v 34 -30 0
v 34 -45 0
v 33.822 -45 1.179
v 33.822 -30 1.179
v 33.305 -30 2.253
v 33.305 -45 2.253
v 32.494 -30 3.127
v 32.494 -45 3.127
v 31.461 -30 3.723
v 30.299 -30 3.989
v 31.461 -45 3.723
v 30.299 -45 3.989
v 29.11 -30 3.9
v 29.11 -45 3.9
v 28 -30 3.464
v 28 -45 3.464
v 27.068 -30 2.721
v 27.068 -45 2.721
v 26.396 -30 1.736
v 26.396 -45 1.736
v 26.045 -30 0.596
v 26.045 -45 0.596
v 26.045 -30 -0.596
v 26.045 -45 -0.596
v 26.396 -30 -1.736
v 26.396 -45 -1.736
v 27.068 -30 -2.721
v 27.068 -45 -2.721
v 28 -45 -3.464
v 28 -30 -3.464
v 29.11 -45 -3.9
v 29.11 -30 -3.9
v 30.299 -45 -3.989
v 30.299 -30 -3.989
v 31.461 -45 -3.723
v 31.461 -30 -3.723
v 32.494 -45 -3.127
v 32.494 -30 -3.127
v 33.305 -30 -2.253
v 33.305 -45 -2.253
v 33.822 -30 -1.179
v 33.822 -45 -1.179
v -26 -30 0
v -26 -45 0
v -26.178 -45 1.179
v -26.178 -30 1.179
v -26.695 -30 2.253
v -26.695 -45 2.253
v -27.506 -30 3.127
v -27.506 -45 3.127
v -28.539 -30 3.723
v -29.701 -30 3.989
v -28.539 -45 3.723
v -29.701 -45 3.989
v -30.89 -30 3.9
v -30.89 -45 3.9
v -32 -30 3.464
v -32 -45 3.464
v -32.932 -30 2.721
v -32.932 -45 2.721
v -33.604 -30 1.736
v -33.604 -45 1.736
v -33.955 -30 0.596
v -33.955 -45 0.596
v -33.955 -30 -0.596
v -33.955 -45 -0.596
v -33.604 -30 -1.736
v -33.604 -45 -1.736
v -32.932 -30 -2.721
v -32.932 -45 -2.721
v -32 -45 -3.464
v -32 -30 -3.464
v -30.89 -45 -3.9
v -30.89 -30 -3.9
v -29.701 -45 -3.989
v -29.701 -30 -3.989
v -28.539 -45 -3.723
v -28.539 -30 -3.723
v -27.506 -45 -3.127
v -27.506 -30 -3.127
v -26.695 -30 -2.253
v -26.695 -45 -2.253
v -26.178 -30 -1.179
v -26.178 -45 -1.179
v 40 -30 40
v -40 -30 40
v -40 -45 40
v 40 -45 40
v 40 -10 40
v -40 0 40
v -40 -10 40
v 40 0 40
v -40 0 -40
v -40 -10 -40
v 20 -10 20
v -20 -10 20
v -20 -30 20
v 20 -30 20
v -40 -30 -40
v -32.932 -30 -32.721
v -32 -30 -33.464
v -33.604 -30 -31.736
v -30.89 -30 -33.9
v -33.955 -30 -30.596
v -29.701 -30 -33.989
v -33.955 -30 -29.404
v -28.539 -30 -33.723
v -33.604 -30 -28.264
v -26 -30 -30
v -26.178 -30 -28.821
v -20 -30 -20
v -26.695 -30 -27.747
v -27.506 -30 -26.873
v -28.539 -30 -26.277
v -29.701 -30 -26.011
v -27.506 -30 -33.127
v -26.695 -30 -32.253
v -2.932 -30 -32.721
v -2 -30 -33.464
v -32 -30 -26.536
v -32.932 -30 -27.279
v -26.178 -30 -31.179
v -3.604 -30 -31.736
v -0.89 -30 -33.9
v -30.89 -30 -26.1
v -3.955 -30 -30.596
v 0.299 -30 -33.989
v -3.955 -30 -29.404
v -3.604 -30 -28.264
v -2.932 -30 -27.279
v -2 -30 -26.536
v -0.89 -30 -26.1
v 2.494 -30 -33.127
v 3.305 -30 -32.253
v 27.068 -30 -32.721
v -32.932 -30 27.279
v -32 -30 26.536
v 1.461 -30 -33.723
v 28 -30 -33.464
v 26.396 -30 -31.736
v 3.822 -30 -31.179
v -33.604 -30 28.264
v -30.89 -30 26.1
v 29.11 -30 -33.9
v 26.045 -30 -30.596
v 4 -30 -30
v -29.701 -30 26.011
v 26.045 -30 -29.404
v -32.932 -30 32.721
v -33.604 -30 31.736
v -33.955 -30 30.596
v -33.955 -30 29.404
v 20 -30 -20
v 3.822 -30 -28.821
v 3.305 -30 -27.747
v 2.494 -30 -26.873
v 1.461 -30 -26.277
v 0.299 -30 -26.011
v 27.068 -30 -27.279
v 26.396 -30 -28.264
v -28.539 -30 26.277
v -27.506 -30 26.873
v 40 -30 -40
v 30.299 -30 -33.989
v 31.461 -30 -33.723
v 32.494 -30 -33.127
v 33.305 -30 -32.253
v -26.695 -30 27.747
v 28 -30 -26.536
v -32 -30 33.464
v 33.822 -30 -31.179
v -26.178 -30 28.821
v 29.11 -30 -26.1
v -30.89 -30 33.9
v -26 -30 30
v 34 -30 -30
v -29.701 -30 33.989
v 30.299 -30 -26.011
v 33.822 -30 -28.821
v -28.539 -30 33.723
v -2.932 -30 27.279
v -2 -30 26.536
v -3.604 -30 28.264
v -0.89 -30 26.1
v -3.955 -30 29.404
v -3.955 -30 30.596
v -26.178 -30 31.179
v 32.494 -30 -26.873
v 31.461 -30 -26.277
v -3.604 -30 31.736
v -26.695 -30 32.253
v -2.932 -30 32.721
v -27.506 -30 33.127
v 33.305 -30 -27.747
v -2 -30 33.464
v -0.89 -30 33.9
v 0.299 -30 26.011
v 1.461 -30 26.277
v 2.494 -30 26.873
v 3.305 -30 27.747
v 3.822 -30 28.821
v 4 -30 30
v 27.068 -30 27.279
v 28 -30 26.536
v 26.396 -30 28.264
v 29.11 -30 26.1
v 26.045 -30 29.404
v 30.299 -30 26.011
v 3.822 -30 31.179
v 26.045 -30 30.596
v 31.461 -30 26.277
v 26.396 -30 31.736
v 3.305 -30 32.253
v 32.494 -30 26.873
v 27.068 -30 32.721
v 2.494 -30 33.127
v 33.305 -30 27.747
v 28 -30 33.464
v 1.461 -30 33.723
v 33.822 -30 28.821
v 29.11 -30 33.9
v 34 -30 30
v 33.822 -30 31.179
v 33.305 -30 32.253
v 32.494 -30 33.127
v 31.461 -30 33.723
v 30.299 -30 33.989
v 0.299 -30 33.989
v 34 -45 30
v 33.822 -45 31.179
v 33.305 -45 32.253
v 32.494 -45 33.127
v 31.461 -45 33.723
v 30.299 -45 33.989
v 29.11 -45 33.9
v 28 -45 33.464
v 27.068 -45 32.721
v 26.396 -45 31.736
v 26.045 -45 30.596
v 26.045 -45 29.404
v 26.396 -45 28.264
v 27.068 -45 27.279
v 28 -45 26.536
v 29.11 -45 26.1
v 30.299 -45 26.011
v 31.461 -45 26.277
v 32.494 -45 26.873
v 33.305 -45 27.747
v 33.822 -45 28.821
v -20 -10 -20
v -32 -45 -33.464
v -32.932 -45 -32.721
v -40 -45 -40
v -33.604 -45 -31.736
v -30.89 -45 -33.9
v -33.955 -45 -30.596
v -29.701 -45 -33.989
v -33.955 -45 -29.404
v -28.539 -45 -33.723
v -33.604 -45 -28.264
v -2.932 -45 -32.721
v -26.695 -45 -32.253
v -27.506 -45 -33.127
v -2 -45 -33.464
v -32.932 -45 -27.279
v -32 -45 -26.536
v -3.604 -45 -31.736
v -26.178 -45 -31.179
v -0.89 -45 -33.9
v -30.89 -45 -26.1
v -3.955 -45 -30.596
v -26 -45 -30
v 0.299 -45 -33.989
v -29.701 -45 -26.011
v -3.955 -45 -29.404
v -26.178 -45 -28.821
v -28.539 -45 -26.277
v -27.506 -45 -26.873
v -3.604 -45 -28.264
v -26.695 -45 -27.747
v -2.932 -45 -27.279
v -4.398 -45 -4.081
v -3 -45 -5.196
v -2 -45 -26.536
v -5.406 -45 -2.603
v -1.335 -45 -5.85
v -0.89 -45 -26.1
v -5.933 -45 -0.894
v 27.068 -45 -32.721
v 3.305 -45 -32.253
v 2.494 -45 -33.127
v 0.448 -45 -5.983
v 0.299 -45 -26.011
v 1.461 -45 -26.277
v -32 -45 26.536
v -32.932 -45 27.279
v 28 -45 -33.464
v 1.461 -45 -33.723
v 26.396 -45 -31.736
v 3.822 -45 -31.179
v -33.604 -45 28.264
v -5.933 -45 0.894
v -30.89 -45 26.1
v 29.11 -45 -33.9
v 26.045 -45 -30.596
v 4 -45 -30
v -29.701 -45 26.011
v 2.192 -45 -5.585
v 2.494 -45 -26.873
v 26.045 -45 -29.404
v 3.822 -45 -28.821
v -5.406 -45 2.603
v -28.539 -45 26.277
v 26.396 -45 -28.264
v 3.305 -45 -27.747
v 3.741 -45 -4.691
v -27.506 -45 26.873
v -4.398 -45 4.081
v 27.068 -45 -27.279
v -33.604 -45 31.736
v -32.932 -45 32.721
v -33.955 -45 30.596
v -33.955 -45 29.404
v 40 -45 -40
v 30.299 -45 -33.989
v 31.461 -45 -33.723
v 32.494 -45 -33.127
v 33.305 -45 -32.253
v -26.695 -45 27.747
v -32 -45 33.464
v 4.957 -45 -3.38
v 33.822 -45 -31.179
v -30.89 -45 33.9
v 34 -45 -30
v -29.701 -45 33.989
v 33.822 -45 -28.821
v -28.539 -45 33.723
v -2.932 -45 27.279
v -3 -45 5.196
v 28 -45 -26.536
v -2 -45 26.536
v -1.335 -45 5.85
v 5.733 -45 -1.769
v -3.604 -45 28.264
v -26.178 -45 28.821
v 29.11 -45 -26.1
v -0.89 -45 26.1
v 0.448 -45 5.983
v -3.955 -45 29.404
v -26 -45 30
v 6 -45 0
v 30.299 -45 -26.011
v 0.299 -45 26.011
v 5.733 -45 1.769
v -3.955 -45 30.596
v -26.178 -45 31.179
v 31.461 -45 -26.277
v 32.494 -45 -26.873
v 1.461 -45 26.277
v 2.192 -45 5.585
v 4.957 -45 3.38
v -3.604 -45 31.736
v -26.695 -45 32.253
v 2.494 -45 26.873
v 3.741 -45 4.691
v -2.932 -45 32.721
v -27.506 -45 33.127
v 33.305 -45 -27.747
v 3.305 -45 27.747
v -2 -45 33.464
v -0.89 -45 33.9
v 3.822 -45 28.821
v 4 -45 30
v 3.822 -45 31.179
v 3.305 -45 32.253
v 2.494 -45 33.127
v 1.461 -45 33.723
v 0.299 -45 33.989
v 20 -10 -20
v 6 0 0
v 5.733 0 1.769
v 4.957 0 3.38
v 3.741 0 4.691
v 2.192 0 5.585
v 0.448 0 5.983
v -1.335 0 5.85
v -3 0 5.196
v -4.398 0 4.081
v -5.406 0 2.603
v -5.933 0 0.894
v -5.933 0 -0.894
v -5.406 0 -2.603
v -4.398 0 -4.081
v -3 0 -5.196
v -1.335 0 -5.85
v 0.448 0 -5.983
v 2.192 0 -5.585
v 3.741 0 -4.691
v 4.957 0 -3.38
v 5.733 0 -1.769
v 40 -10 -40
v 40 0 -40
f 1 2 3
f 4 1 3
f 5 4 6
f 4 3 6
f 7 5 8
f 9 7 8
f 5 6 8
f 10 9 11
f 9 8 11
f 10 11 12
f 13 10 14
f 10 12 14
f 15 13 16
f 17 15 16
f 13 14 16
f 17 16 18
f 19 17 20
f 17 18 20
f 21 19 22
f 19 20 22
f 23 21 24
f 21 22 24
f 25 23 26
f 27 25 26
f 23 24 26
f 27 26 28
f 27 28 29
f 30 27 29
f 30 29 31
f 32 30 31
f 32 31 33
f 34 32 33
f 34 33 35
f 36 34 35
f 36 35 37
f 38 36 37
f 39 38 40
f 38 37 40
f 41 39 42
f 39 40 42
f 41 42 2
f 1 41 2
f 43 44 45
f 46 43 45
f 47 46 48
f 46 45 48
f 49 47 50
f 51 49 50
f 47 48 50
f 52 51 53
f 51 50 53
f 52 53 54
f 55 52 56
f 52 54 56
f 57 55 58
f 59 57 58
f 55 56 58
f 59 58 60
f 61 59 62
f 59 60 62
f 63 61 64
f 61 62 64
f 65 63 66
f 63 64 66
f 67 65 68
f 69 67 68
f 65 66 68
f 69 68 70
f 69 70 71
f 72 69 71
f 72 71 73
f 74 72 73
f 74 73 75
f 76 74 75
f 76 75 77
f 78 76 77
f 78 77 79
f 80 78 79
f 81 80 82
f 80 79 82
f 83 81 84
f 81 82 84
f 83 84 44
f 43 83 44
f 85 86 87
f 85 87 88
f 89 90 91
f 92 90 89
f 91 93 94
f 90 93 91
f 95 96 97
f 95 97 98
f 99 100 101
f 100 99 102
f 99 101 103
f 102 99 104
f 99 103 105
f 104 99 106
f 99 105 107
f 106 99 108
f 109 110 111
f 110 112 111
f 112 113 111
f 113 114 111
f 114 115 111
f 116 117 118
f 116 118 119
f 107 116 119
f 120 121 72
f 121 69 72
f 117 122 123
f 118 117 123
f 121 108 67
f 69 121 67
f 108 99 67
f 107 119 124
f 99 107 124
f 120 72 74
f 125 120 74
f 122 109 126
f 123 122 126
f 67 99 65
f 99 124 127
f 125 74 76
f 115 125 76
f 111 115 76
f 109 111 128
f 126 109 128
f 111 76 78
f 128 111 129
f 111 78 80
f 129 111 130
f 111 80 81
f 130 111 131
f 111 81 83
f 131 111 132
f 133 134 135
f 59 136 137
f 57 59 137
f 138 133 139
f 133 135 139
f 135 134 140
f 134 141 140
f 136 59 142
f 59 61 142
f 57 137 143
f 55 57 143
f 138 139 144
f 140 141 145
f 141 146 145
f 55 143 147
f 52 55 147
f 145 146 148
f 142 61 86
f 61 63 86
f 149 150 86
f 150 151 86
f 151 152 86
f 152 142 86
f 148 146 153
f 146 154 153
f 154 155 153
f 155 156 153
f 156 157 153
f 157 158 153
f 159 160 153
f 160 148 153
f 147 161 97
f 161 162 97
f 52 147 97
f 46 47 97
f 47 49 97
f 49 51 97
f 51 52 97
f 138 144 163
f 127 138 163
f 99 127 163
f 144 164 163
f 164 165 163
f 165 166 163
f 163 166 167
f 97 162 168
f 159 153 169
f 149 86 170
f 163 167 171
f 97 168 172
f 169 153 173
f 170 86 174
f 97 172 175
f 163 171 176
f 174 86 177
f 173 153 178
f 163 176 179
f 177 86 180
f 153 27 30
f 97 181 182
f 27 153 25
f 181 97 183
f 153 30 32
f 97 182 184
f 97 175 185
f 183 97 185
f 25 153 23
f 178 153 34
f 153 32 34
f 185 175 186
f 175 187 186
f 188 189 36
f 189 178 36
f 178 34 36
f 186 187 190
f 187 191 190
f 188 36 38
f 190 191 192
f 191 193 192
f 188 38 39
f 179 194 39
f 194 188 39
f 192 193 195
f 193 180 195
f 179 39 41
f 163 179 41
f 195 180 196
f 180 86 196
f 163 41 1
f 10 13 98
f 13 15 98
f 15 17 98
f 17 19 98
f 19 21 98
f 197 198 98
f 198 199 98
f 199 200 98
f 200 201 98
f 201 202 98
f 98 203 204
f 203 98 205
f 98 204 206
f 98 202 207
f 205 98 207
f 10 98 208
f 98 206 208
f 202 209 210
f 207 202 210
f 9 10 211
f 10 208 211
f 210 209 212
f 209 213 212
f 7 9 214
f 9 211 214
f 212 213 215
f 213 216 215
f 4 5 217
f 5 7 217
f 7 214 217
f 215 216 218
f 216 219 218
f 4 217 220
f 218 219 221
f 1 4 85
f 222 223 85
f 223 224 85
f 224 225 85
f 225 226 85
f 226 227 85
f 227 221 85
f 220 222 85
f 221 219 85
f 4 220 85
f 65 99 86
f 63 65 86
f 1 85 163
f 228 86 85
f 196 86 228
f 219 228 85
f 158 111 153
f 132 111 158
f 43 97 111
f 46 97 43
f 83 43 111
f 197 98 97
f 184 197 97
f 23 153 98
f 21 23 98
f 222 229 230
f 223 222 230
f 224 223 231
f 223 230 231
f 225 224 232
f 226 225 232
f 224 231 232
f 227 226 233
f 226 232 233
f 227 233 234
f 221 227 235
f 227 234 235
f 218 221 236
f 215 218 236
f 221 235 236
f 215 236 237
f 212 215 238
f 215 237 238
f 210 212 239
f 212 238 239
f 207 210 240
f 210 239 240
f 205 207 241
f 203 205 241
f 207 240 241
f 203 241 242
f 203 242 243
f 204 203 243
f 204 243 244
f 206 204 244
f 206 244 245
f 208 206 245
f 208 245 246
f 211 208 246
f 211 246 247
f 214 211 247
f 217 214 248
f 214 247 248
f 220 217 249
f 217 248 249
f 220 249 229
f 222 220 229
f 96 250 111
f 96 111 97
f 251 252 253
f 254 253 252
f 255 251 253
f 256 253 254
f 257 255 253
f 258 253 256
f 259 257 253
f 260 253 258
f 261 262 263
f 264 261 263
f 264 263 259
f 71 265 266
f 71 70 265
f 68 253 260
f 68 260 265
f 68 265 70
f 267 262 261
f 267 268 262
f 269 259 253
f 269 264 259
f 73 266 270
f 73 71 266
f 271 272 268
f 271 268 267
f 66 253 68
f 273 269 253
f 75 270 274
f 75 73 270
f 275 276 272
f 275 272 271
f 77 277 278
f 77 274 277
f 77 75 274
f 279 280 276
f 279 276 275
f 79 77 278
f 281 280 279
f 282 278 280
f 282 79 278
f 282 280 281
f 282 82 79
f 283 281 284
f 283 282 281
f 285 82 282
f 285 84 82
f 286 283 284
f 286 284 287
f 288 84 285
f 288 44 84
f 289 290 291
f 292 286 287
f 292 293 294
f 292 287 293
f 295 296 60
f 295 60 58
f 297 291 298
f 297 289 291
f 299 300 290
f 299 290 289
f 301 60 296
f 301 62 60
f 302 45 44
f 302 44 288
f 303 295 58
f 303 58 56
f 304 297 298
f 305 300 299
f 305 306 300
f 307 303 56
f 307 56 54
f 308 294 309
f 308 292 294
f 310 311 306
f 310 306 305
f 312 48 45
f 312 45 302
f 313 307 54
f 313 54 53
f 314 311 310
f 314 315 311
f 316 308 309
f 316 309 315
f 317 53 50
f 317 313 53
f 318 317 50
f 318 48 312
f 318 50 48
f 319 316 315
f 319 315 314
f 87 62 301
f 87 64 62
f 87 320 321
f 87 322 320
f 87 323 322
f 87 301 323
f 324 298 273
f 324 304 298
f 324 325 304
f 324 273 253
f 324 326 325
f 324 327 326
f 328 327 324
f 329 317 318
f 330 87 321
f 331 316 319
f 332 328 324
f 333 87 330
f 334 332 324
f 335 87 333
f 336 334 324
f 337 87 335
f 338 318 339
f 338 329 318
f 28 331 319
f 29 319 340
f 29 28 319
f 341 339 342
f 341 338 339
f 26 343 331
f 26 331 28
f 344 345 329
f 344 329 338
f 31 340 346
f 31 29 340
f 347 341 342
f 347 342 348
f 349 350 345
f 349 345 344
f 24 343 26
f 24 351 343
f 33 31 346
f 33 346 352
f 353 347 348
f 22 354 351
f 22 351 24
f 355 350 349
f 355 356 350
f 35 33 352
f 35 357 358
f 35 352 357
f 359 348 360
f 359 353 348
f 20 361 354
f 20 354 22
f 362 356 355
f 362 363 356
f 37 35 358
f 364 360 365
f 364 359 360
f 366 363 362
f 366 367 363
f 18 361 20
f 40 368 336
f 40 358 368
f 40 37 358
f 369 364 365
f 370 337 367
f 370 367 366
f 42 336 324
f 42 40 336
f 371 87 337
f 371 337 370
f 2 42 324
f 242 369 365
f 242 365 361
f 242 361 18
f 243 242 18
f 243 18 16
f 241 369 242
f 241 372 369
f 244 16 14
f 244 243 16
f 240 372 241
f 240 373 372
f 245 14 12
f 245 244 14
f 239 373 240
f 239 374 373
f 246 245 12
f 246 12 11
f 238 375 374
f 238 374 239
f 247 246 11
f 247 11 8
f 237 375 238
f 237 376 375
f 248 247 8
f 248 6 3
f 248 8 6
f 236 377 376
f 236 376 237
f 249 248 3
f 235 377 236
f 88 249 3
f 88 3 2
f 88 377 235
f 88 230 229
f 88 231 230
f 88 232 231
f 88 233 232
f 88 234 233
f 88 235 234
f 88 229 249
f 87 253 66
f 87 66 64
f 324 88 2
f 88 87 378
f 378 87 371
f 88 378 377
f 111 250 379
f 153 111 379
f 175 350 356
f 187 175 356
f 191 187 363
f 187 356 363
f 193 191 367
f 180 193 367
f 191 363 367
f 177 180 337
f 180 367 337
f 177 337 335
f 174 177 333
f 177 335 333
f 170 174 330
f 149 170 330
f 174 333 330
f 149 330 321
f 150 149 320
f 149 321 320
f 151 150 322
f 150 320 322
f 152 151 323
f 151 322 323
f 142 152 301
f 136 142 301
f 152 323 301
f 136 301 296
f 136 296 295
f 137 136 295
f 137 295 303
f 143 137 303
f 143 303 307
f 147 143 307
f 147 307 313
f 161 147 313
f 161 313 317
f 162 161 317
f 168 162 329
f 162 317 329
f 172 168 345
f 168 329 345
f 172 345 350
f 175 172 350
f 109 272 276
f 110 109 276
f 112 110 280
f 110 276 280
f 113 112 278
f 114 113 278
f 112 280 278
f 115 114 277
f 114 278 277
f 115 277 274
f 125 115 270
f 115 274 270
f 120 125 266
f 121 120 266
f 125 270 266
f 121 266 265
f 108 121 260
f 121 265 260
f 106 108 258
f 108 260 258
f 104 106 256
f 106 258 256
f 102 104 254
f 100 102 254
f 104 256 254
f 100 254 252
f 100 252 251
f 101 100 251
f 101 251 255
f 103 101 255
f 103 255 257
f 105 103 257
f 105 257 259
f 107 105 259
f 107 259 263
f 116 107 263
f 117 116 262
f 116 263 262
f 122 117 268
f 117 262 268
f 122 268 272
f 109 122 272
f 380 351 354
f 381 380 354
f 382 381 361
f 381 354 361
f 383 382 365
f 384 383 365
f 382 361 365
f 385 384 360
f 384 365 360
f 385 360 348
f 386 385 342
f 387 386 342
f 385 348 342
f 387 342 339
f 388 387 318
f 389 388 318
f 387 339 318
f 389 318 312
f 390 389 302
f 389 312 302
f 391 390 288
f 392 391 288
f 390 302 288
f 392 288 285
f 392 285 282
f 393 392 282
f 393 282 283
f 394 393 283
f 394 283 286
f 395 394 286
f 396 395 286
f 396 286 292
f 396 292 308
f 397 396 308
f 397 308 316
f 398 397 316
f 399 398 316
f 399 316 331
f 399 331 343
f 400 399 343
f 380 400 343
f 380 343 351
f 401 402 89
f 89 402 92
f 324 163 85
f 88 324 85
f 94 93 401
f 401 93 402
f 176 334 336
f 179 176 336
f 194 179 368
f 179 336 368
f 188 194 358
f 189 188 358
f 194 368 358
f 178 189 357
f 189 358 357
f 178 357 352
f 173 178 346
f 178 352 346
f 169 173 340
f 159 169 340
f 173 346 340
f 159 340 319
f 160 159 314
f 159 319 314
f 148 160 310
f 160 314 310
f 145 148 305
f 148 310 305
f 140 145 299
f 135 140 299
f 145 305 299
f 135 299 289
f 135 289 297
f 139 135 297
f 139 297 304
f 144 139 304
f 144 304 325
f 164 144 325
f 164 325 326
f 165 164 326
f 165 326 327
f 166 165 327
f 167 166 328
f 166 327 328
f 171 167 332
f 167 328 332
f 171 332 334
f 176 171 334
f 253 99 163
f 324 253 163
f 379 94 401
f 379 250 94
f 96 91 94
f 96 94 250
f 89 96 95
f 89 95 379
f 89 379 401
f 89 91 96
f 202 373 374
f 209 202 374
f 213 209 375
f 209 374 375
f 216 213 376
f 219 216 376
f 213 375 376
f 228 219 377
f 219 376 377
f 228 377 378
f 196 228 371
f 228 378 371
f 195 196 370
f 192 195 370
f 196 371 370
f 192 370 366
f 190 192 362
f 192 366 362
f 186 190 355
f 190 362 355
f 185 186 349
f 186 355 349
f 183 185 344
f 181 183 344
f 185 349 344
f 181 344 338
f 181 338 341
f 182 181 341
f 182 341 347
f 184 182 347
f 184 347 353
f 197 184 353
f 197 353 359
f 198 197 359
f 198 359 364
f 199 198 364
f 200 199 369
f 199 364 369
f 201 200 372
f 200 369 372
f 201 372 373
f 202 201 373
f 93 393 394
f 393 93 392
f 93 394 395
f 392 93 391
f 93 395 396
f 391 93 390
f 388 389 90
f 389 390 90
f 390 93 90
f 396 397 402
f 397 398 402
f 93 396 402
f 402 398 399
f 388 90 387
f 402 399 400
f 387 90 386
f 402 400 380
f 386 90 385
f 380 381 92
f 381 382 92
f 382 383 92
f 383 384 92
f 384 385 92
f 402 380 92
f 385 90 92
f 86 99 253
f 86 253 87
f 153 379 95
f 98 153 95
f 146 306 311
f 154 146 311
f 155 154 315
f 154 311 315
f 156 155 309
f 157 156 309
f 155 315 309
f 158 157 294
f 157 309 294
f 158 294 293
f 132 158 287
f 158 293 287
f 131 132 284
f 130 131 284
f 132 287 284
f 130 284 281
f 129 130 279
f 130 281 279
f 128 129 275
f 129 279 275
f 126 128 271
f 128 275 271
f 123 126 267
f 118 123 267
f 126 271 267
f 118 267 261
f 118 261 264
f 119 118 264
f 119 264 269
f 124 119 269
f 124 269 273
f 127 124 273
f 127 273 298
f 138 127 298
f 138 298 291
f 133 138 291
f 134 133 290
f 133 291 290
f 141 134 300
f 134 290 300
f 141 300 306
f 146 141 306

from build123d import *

# Parameters (mm, degrees)
SKETCH_W        = 80
SKETCH_H        = 80
PAD_DEPTH       = 10
SKETCH001_W     = 40
SKETCH001_H     = 40
PAD001_DEPTH    = 20
SKETCH002_W     = 80
SKETCH002_H     = 80
PAD002_DEPTH    = 15
SKETCH003_R     = 4
POCKET_DEPTH    = 15
SKETCH004_R     = 6
POCKET001_DEPTH = 45.001


with BuildPart() as part:
    # Sketch → Pad (new body)
    with BuildSketch(Plane.XZ):
        Rectangle(SKETCH_W, SKETCH_H)
    extrude(amount=PAD_DEPTH)

    # Sketch001 (on Face6 of Pad) → Pad001 (join)
    with BuildSketch(Plane.XZ.offset(10)):
        Rectangle(SKETCH001_W, SKETCH001_H)
    extrude(amount=PAD001_DEPTH)

    # Sketch002 (on Face11 of Pad001) → Pad002 (join)
    with BuildSketch(Plane.XZ.offset(30)):
        Rectangle(SKETCH002_W, SKETCH002_H)
    extrude(amount=PAD002_DEPTH)

    # Sketch003 (on Face5 of Pad002) → Pocket (cut)
    with BuildSketch(Plane.XZ.offset(45)):
        with Locations((-30, 30)):
            Circle(SKETCH003_R)
        with Locations((30, 30)):
            Circle(SKETCH003_R)
        with Locations((30, -30)):
            Circle(SKETCH003_R)
        with Locations((-30, -30)):
            Circle(SKETCH003_R)
        with Locations((0, -30)):
            Circle(SKETCH003_R)
        with Locations((0, 30)):
            Circle(SKETCH003_R)
        with Locations((-30, 0)):
            Circle(SKETCH003_R)
        with Locations((30, 0)):
            Circle(SKETCH003_R)
    extrude(amount=-POCKET_DEPTH, mode=Mode.SUBTRACT)

    # Sketch004 (on Face5 of Pocket) → Pocket001 (cut, through all)
    with BuildSketch(Plane.XZ.offset(45)):
        Circle(SKETCH004_R)
    extrude(amount=-POCKET001_DEPTH, mode=Mode.SUBTRACT)


solid = part.part
